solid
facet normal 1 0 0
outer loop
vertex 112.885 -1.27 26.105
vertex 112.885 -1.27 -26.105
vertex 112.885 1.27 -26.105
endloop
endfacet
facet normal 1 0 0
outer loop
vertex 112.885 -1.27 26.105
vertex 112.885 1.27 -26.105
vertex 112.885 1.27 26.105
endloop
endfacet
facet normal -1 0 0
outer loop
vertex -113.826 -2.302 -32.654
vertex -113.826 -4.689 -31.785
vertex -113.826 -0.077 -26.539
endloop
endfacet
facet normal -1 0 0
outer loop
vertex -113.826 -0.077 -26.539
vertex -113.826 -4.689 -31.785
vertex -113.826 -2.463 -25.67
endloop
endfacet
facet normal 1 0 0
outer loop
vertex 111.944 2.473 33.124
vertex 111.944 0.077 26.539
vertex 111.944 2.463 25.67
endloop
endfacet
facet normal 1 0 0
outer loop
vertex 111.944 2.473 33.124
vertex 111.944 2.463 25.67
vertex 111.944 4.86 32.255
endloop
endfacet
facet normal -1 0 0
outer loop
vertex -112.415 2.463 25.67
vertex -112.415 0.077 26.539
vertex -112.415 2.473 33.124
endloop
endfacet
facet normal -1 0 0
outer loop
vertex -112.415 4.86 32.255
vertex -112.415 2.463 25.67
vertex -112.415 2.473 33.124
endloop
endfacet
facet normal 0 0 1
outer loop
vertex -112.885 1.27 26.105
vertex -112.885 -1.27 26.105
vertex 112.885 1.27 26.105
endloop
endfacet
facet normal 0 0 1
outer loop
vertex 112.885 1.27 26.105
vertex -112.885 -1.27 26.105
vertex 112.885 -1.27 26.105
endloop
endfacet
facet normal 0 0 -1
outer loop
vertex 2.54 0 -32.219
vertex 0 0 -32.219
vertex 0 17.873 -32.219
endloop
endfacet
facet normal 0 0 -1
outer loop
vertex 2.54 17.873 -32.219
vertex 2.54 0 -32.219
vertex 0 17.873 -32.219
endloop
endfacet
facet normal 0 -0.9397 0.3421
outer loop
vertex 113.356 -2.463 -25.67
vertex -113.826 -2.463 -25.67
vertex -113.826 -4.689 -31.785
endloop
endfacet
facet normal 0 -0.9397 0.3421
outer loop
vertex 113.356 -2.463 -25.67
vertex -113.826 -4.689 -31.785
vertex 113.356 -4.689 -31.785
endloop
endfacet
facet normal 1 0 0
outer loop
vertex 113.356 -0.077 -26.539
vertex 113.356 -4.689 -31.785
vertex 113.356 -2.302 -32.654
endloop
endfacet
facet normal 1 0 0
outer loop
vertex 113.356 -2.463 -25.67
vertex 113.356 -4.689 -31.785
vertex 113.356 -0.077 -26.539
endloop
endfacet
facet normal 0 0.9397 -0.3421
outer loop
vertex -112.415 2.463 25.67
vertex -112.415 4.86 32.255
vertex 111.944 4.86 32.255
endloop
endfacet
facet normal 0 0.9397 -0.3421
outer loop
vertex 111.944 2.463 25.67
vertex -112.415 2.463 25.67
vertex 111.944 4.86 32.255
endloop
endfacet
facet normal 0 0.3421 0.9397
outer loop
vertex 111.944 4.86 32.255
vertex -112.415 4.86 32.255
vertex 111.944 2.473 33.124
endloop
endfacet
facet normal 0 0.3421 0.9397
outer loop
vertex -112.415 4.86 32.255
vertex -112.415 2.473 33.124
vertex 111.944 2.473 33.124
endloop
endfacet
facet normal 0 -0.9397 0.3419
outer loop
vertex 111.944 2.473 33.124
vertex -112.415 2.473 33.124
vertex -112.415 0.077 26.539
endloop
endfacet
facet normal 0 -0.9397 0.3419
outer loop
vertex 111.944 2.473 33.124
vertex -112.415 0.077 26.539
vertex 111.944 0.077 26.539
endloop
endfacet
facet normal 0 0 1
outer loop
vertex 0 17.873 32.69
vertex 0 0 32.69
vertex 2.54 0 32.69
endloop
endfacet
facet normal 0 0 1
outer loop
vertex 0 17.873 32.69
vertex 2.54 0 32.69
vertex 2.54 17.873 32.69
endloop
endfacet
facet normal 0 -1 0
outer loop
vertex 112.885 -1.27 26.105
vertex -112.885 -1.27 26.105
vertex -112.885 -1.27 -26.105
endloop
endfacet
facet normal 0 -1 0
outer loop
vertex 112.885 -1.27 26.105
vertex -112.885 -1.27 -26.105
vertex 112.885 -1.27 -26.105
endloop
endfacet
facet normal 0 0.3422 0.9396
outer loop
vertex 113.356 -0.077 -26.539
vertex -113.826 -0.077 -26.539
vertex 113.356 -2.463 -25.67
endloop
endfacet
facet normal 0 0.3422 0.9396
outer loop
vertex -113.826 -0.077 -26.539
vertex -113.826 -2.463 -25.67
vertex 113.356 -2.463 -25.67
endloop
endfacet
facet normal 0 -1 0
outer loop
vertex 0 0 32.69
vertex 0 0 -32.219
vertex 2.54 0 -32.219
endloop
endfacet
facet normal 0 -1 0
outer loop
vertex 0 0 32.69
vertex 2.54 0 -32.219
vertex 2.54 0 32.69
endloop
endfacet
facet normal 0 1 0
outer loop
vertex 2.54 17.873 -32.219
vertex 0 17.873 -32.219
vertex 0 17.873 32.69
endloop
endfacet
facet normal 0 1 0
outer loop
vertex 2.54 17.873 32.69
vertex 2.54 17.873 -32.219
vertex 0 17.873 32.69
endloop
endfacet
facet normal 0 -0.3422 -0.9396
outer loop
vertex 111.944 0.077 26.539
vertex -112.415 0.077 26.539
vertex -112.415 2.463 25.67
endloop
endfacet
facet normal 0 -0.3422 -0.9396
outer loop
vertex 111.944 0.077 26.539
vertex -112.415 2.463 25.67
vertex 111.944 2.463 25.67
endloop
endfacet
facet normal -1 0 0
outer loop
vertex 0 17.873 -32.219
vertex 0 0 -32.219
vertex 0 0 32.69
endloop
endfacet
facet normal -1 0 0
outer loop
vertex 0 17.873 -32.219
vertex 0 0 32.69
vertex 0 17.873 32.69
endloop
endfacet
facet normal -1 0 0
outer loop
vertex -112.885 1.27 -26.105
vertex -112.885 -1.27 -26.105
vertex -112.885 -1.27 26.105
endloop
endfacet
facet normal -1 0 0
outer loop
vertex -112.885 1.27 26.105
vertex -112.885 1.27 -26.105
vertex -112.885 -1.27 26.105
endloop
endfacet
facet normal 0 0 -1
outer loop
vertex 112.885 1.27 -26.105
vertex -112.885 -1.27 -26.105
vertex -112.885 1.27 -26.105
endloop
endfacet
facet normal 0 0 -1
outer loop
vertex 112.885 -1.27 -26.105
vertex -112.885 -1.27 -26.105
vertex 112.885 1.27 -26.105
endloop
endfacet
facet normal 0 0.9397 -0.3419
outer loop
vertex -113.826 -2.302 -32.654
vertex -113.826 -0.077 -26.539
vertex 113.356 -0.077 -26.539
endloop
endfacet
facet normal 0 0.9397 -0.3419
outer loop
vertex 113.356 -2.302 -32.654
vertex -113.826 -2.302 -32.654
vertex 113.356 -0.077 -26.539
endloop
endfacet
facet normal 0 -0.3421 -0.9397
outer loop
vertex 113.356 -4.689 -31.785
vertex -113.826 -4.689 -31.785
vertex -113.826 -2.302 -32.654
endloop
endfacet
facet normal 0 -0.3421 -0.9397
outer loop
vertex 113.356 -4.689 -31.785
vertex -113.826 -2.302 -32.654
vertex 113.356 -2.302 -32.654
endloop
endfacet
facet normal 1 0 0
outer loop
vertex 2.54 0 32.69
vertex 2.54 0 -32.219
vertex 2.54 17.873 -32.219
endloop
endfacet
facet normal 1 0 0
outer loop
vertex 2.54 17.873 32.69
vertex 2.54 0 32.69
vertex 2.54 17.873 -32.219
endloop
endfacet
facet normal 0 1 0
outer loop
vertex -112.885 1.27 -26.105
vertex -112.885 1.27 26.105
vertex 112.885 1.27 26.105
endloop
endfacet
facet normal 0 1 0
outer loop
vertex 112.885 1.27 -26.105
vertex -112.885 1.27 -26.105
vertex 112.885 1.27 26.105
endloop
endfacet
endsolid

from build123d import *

# Parameters (mm, degrees)
F0_W     = 225.770414
F0_H     = 52.2094
F1_DEPTH = 1.27
F3_W     = 224.359341
F3_H     = 7.007578
F4_DEPTH = 1.27
F6_W     = 227.181472
F6_H     = 6.507041
F7_DEPTH = 1.27
F8_W     = 17.87349
F8_H     = 64.908989
F9_DEPTH = 2.54


with BuildPart() as f1:
    # F0 (on Front) → F1 (new body, symmetric)
    with BuildSketch(Plane.XZ):
        Rectangle(F0_W, F0_H)
    extrude(amount=F1_DEPTH, both=True)


with BuildPart() as f4:
    # F3 (on face) → F4 (new body, symmetric)
    with BuildSketch(Plane(origin=(0, -7.268451, 2.6455), x_dir=(1, 0, 0), z_dir=(0, -0.939693, 0.34202))):
        with Locations((-0.235173, 28.468552)):
            Rectangle(F3_W, F3_H)
    extrude(amount=F4_DEPTH, both=True)


with BuildPart() as f7:
    # F6 (on face) → F7 (new body, symmetric)
    with BuildSketch(Plane(origin=(0, 7.268451, -2.6455), x_dir=(1, 0, 0), z_dir=(0, -0.939693, 0.34202))):
        with Locations((-0.235174, -28.218279)):
            Rectangle(F6_W, F6_H)
    extrude(amount=F7_DEPTH, both=True)


with BuildPart() as f9:
    # F8 (on Right) → F9 (new body)
    with BuildSketch(Plane.YZ):
        with Locations((8.936745, 0.235178)):
            Rectangle(F8_W, F8_H)
    extrude(amount=F9_DEPTH)


solid = Compound([f1.part, f4.part, f7.part, f9.part])
